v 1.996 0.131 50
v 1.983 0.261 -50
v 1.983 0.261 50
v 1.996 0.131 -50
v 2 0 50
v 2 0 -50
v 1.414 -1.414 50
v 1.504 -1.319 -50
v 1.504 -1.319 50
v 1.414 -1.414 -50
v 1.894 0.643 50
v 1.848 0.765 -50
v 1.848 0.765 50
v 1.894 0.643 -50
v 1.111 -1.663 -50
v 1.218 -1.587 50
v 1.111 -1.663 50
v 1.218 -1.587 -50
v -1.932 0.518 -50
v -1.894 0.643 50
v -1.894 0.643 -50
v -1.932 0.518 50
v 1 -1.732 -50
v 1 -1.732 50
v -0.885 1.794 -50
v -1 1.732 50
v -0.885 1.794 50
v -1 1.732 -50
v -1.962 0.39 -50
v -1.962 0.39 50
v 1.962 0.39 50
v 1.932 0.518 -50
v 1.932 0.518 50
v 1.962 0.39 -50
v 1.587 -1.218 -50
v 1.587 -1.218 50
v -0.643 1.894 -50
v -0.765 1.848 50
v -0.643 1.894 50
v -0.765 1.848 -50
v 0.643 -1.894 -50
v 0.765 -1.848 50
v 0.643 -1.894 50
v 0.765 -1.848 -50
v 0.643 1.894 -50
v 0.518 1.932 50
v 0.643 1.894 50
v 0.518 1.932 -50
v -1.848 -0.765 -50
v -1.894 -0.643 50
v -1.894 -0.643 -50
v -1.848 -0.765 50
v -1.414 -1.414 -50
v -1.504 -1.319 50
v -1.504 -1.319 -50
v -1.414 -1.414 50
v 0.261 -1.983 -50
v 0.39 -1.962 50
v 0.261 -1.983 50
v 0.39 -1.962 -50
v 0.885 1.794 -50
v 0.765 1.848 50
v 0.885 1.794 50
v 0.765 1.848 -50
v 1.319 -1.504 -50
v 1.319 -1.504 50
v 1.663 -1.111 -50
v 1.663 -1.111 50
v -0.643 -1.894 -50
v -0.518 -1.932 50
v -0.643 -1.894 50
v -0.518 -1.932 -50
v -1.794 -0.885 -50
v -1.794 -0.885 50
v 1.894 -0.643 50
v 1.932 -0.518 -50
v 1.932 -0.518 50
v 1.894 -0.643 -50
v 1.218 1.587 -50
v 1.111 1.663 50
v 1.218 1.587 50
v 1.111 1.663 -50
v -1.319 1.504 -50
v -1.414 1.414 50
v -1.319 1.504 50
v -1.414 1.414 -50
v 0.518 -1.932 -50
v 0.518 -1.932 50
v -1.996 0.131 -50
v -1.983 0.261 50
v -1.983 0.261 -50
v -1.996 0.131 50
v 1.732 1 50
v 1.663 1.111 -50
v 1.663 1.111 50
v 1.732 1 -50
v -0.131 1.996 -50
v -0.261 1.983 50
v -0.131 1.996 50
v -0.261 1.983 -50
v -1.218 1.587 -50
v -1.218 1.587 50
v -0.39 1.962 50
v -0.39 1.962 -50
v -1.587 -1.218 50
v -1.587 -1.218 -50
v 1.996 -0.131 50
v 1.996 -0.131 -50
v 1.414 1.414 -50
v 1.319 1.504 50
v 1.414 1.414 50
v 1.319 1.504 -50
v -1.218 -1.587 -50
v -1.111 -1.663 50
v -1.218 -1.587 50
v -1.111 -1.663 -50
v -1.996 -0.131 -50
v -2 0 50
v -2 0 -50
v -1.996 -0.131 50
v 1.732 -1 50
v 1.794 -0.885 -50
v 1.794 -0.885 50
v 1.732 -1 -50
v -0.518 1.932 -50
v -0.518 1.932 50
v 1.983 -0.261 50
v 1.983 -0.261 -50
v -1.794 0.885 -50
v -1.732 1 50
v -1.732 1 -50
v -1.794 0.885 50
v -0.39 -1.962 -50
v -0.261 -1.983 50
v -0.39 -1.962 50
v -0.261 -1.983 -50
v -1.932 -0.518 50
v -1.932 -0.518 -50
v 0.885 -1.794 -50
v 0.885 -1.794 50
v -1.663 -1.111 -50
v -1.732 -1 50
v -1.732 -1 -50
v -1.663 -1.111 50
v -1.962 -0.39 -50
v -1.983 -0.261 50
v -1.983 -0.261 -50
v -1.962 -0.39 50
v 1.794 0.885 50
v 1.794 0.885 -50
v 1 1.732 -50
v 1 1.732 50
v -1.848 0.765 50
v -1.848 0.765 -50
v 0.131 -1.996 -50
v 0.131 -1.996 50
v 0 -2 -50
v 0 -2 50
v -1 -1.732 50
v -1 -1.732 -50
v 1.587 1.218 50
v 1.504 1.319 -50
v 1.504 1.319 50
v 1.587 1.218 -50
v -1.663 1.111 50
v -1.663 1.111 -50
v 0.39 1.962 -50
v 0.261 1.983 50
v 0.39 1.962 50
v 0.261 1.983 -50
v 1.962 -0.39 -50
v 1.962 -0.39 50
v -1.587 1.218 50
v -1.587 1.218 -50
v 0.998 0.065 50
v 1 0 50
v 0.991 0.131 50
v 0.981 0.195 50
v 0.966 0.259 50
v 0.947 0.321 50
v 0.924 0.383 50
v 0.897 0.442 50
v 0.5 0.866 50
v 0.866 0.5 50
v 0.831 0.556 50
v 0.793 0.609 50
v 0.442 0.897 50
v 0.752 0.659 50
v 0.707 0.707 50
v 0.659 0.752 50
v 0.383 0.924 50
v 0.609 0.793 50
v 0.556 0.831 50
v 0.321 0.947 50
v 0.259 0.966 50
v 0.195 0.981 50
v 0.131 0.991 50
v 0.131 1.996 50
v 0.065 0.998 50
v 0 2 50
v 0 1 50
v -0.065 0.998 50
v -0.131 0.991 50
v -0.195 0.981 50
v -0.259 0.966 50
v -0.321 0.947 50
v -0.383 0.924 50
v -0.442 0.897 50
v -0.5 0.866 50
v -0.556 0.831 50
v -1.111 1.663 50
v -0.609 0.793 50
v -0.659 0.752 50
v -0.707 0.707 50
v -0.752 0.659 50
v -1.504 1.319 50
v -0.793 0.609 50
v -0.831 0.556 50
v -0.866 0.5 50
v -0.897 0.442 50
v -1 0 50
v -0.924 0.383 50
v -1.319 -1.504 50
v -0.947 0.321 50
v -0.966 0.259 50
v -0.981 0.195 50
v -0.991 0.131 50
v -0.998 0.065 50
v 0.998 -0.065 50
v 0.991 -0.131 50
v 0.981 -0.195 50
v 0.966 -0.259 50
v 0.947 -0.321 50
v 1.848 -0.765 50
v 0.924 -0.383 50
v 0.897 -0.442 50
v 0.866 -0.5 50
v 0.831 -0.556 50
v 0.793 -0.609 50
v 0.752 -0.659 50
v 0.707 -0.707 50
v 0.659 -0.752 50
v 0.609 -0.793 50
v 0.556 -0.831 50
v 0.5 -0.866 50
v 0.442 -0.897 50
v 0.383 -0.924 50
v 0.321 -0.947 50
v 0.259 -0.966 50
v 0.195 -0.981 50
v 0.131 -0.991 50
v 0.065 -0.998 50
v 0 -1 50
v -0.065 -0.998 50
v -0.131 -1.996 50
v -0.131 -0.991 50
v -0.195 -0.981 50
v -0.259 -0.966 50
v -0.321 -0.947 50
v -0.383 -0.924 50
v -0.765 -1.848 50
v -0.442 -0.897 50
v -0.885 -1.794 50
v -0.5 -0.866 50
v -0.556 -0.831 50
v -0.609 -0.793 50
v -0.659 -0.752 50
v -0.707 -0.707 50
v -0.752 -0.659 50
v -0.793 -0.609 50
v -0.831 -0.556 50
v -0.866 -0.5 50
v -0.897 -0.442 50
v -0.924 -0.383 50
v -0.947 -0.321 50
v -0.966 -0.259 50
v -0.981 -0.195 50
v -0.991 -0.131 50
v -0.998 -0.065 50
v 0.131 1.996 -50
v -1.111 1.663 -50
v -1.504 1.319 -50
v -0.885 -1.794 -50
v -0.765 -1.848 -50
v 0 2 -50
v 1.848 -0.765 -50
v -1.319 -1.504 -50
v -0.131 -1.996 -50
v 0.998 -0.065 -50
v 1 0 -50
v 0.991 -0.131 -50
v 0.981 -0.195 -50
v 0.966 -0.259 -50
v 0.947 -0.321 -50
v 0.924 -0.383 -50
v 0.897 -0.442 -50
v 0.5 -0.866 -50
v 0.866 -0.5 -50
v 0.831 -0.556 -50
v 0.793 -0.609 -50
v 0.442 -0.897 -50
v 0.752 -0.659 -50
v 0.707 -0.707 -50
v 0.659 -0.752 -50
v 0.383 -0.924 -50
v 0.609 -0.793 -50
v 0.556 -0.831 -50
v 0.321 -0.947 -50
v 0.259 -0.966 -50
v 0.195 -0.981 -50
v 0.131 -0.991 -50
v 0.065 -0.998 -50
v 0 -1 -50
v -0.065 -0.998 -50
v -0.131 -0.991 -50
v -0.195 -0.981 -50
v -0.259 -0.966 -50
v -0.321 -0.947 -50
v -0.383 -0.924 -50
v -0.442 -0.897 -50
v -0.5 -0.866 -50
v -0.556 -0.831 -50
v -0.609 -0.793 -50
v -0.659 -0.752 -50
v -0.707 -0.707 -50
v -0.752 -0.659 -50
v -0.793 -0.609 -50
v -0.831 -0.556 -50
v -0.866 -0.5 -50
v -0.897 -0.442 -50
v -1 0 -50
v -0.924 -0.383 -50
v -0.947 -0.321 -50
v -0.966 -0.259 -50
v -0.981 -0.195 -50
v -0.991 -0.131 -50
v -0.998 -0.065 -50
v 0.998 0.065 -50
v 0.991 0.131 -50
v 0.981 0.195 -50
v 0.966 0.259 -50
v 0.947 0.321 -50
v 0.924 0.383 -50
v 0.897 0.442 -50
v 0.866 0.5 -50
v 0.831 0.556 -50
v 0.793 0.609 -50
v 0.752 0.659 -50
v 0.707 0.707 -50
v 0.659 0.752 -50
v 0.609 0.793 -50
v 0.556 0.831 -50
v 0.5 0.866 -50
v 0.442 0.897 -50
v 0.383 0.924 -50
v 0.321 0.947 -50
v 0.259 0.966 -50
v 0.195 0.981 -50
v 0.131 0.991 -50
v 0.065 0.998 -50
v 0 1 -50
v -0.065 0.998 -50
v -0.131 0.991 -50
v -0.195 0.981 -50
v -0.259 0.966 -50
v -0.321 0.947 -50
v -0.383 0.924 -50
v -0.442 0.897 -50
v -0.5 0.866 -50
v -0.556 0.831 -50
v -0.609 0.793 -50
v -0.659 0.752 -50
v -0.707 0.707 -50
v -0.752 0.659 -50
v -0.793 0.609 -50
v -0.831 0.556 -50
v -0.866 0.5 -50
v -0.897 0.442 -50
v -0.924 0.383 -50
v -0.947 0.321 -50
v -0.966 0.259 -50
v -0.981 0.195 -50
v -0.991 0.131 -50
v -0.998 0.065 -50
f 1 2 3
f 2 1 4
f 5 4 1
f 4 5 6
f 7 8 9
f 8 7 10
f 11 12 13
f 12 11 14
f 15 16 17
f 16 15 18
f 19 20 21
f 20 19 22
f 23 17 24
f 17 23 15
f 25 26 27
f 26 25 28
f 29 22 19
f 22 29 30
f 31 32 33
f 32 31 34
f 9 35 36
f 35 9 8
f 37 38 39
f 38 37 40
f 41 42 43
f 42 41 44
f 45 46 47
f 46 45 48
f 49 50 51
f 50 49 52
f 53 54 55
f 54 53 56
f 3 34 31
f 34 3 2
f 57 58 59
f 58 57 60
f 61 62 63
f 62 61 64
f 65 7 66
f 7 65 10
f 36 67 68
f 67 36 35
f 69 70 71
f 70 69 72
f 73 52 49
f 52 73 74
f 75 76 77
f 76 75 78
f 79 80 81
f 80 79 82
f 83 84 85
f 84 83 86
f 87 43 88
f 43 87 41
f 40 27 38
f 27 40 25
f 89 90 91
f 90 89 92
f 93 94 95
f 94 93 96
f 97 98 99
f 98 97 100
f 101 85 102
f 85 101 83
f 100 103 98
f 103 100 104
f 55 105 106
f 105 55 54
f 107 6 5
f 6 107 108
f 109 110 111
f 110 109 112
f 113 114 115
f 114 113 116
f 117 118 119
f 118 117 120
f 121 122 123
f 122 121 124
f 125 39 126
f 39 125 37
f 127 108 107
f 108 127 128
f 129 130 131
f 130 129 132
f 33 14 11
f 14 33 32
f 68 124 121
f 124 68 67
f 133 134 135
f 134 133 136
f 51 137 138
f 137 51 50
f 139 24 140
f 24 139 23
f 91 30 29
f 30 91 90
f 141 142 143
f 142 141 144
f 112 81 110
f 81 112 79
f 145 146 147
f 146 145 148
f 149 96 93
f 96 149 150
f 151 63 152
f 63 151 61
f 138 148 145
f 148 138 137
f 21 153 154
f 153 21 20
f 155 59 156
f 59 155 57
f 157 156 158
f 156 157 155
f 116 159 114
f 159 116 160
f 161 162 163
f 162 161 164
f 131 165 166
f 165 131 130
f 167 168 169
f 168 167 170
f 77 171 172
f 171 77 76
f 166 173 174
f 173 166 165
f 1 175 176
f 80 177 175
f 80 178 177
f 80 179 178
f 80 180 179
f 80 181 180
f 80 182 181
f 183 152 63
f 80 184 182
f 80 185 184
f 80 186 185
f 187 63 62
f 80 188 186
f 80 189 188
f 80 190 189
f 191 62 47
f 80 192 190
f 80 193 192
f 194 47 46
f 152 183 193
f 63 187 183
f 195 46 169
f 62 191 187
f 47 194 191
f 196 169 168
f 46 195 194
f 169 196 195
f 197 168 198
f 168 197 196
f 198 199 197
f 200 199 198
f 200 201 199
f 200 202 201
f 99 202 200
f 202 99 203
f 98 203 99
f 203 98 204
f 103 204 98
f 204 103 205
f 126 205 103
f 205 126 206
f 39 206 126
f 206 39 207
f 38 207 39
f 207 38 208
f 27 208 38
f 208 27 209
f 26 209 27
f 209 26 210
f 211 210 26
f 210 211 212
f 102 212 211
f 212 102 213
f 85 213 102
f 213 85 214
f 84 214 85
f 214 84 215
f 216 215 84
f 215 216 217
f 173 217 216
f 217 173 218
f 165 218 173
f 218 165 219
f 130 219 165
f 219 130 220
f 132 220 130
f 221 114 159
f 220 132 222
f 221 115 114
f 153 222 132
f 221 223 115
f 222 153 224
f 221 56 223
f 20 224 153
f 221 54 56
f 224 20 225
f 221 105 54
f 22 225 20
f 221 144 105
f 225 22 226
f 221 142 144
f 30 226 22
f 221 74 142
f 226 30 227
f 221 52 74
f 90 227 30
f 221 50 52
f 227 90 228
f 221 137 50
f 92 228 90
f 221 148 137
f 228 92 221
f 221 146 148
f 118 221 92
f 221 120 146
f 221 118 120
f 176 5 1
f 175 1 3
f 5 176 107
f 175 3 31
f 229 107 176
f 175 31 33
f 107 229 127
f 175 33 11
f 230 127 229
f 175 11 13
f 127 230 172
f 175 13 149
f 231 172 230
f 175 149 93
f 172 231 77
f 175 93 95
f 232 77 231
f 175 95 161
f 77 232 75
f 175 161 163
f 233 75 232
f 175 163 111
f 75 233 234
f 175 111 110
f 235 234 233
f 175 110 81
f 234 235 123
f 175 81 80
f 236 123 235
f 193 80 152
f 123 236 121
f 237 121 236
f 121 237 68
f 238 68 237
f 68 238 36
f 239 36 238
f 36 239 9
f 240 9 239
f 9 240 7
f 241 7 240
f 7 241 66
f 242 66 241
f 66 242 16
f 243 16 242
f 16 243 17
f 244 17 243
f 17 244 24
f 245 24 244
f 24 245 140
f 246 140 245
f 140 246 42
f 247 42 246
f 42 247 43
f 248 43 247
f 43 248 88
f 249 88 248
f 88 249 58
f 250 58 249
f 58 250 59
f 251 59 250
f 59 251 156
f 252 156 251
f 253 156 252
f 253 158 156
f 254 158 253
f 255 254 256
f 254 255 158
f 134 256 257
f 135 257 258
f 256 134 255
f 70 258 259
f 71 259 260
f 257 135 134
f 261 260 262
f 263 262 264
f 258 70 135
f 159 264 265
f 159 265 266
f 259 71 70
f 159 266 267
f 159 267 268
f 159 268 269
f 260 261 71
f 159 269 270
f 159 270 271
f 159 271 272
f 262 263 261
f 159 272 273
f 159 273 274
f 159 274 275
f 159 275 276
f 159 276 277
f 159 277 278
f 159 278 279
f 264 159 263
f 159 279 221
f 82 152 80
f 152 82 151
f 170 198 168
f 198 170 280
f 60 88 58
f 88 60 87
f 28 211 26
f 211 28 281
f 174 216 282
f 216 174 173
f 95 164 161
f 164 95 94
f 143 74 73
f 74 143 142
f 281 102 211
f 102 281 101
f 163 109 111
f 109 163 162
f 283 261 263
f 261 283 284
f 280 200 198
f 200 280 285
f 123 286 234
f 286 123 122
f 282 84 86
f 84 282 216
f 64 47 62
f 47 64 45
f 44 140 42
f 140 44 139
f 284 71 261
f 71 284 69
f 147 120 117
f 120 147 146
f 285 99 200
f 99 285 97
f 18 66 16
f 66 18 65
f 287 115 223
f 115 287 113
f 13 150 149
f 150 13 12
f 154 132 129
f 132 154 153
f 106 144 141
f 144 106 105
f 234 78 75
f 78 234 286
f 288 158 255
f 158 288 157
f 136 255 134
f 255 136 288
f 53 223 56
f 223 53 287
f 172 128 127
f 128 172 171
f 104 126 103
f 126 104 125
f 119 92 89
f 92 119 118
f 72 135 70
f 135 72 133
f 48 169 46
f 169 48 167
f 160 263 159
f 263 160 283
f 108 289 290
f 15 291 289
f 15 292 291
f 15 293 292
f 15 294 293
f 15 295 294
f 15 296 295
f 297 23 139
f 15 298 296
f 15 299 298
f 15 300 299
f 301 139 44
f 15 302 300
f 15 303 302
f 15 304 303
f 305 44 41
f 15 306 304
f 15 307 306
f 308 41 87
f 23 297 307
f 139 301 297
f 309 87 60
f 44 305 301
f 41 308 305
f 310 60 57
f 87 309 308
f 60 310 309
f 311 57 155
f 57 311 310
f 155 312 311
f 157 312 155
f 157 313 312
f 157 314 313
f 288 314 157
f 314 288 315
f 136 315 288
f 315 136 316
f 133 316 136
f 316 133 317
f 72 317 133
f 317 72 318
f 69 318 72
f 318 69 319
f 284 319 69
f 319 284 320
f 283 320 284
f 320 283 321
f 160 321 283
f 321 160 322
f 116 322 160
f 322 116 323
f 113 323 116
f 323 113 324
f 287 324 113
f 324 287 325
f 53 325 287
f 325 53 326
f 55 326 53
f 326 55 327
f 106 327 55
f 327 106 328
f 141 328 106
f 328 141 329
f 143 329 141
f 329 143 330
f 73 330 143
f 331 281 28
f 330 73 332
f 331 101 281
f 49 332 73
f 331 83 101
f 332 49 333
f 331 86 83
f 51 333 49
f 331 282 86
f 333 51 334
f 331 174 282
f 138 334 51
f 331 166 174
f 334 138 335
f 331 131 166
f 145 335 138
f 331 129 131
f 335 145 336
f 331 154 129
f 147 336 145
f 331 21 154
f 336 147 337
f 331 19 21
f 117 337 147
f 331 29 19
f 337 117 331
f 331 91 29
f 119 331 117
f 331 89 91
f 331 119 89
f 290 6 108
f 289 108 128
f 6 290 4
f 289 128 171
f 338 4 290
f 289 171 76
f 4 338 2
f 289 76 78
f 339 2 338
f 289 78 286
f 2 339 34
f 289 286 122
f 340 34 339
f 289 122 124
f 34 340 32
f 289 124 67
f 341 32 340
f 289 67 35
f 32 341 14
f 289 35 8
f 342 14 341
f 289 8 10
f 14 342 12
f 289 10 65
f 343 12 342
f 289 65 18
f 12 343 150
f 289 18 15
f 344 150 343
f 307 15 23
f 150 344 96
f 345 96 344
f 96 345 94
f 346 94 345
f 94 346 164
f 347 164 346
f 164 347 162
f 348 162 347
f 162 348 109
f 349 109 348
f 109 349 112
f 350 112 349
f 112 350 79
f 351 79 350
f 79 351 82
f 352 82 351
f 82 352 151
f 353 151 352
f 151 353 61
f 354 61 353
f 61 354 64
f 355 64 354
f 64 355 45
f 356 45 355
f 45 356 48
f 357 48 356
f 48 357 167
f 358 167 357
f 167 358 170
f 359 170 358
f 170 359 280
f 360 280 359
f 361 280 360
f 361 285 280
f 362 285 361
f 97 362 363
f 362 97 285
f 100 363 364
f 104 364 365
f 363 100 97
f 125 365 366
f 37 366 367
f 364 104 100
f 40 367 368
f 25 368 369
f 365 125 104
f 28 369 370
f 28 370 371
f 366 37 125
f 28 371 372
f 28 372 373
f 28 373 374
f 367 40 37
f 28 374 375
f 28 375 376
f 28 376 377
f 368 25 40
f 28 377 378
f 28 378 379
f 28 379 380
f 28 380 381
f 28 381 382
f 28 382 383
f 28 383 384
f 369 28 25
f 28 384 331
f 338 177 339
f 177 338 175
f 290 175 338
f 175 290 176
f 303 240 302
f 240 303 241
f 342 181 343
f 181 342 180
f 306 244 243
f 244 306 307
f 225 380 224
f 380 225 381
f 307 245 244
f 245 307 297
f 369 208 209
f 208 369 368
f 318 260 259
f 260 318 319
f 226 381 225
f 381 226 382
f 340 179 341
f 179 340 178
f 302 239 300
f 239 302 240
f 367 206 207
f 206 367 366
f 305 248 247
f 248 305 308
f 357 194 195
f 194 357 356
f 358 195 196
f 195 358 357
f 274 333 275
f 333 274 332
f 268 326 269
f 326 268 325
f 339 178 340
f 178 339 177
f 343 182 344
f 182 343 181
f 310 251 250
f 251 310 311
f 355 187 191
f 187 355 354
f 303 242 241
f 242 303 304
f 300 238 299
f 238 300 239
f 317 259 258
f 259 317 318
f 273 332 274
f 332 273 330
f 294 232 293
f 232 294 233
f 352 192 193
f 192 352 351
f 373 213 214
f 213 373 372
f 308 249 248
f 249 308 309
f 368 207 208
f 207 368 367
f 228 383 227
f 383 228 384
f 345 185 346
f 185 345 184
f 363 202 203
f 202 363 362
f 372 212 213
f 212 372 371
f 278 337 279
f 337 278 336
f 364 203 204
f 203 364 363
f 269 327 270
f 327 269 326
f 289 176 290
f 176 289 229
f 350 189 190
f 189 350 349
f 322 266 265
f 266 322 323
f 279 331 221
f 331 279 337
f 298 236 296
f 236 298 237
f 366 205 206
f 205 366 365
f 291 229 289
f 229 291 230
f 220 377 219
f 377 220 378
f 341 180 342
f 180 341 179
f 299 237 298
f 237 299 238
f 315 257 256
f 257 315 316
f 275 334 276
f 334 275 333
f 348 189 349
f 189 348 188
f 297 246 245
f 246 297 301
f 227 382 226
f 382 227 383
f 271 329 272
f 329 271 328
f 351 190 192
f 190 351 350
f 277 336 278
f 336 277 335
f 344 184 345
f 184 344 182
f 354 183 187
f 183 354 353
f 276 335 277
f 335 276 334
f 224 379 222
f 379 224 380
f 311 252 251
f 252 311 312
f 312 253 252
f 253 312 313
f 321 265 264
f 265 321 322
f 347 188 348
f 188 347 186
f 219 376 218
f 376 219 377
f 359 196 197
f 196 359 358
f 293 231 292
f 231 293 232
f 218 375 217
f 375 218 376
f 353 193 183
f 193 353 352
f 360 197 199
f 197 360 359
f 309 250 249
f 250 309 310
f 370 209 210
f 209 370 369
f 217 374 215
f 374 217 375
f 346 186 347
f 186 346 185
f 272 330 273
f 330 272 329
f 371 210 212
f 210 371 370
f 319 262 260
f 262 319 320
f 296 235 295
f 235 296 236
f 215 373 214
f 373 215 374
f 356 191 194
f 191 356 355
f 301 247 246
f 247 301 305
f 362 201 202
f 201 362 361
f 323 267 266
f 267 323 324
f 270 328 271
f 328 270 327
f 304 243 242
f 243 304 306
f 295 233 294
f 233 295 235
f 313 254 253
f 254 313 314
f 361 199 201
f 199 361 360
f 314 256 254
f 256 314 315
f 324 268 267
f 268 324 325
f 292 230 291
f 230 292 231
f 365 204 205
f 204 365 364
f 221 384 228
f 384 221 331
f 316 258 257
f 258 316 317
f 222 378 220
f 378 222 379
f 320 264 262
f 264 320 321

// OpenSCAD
$fn=96;

module ptfe_tube(length=100, od=4, id=2) {
    difference() {
        cylinder(h=length, d=od, center=true);
        cylinder(h=length+0.2, d=id, center=true);
    }
}

ptfe_tube(length=100, od=4, id=2);
